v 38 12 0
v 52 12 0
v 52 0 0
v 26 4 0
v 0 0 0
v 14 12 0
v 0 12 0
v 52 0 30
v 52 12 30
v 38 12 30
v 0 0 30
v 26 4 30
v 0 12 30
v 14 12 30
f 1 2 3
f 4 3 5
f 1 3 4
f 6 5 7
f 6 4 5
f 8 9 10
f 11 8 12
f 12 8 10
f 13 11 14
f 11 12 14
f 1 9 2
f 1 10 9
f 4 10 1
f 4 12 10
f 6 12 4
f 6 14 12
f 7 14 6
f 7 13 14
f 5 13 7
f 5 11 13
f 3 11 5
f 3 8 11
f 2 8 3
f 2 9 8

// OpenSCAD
$fn = 32;

// ----------------------------------------------------------------------
// V guide rail: vway, 52 mm wide
// ----------------------------------------------------------------------

// --- parameters (mm) ---
rail_w = 52;              // rail width, X
base_t = 12;              // base plate thickness
v_depth = 8;              // V feature depth / height
v_half_w = 12;            // half width of the V at the base face
plate_t = 30;             // rail length, Z (the extrusion height)

profile = [[0, 0], [52, 0], [52, 12], [38, 12], [26, 4], [14, 12], [0, 12]];  // primary outline, 7 points, counter clockwise

// --- the one profile operation ---
linear_extrude(height = plate_t) polygon(points = profile);
